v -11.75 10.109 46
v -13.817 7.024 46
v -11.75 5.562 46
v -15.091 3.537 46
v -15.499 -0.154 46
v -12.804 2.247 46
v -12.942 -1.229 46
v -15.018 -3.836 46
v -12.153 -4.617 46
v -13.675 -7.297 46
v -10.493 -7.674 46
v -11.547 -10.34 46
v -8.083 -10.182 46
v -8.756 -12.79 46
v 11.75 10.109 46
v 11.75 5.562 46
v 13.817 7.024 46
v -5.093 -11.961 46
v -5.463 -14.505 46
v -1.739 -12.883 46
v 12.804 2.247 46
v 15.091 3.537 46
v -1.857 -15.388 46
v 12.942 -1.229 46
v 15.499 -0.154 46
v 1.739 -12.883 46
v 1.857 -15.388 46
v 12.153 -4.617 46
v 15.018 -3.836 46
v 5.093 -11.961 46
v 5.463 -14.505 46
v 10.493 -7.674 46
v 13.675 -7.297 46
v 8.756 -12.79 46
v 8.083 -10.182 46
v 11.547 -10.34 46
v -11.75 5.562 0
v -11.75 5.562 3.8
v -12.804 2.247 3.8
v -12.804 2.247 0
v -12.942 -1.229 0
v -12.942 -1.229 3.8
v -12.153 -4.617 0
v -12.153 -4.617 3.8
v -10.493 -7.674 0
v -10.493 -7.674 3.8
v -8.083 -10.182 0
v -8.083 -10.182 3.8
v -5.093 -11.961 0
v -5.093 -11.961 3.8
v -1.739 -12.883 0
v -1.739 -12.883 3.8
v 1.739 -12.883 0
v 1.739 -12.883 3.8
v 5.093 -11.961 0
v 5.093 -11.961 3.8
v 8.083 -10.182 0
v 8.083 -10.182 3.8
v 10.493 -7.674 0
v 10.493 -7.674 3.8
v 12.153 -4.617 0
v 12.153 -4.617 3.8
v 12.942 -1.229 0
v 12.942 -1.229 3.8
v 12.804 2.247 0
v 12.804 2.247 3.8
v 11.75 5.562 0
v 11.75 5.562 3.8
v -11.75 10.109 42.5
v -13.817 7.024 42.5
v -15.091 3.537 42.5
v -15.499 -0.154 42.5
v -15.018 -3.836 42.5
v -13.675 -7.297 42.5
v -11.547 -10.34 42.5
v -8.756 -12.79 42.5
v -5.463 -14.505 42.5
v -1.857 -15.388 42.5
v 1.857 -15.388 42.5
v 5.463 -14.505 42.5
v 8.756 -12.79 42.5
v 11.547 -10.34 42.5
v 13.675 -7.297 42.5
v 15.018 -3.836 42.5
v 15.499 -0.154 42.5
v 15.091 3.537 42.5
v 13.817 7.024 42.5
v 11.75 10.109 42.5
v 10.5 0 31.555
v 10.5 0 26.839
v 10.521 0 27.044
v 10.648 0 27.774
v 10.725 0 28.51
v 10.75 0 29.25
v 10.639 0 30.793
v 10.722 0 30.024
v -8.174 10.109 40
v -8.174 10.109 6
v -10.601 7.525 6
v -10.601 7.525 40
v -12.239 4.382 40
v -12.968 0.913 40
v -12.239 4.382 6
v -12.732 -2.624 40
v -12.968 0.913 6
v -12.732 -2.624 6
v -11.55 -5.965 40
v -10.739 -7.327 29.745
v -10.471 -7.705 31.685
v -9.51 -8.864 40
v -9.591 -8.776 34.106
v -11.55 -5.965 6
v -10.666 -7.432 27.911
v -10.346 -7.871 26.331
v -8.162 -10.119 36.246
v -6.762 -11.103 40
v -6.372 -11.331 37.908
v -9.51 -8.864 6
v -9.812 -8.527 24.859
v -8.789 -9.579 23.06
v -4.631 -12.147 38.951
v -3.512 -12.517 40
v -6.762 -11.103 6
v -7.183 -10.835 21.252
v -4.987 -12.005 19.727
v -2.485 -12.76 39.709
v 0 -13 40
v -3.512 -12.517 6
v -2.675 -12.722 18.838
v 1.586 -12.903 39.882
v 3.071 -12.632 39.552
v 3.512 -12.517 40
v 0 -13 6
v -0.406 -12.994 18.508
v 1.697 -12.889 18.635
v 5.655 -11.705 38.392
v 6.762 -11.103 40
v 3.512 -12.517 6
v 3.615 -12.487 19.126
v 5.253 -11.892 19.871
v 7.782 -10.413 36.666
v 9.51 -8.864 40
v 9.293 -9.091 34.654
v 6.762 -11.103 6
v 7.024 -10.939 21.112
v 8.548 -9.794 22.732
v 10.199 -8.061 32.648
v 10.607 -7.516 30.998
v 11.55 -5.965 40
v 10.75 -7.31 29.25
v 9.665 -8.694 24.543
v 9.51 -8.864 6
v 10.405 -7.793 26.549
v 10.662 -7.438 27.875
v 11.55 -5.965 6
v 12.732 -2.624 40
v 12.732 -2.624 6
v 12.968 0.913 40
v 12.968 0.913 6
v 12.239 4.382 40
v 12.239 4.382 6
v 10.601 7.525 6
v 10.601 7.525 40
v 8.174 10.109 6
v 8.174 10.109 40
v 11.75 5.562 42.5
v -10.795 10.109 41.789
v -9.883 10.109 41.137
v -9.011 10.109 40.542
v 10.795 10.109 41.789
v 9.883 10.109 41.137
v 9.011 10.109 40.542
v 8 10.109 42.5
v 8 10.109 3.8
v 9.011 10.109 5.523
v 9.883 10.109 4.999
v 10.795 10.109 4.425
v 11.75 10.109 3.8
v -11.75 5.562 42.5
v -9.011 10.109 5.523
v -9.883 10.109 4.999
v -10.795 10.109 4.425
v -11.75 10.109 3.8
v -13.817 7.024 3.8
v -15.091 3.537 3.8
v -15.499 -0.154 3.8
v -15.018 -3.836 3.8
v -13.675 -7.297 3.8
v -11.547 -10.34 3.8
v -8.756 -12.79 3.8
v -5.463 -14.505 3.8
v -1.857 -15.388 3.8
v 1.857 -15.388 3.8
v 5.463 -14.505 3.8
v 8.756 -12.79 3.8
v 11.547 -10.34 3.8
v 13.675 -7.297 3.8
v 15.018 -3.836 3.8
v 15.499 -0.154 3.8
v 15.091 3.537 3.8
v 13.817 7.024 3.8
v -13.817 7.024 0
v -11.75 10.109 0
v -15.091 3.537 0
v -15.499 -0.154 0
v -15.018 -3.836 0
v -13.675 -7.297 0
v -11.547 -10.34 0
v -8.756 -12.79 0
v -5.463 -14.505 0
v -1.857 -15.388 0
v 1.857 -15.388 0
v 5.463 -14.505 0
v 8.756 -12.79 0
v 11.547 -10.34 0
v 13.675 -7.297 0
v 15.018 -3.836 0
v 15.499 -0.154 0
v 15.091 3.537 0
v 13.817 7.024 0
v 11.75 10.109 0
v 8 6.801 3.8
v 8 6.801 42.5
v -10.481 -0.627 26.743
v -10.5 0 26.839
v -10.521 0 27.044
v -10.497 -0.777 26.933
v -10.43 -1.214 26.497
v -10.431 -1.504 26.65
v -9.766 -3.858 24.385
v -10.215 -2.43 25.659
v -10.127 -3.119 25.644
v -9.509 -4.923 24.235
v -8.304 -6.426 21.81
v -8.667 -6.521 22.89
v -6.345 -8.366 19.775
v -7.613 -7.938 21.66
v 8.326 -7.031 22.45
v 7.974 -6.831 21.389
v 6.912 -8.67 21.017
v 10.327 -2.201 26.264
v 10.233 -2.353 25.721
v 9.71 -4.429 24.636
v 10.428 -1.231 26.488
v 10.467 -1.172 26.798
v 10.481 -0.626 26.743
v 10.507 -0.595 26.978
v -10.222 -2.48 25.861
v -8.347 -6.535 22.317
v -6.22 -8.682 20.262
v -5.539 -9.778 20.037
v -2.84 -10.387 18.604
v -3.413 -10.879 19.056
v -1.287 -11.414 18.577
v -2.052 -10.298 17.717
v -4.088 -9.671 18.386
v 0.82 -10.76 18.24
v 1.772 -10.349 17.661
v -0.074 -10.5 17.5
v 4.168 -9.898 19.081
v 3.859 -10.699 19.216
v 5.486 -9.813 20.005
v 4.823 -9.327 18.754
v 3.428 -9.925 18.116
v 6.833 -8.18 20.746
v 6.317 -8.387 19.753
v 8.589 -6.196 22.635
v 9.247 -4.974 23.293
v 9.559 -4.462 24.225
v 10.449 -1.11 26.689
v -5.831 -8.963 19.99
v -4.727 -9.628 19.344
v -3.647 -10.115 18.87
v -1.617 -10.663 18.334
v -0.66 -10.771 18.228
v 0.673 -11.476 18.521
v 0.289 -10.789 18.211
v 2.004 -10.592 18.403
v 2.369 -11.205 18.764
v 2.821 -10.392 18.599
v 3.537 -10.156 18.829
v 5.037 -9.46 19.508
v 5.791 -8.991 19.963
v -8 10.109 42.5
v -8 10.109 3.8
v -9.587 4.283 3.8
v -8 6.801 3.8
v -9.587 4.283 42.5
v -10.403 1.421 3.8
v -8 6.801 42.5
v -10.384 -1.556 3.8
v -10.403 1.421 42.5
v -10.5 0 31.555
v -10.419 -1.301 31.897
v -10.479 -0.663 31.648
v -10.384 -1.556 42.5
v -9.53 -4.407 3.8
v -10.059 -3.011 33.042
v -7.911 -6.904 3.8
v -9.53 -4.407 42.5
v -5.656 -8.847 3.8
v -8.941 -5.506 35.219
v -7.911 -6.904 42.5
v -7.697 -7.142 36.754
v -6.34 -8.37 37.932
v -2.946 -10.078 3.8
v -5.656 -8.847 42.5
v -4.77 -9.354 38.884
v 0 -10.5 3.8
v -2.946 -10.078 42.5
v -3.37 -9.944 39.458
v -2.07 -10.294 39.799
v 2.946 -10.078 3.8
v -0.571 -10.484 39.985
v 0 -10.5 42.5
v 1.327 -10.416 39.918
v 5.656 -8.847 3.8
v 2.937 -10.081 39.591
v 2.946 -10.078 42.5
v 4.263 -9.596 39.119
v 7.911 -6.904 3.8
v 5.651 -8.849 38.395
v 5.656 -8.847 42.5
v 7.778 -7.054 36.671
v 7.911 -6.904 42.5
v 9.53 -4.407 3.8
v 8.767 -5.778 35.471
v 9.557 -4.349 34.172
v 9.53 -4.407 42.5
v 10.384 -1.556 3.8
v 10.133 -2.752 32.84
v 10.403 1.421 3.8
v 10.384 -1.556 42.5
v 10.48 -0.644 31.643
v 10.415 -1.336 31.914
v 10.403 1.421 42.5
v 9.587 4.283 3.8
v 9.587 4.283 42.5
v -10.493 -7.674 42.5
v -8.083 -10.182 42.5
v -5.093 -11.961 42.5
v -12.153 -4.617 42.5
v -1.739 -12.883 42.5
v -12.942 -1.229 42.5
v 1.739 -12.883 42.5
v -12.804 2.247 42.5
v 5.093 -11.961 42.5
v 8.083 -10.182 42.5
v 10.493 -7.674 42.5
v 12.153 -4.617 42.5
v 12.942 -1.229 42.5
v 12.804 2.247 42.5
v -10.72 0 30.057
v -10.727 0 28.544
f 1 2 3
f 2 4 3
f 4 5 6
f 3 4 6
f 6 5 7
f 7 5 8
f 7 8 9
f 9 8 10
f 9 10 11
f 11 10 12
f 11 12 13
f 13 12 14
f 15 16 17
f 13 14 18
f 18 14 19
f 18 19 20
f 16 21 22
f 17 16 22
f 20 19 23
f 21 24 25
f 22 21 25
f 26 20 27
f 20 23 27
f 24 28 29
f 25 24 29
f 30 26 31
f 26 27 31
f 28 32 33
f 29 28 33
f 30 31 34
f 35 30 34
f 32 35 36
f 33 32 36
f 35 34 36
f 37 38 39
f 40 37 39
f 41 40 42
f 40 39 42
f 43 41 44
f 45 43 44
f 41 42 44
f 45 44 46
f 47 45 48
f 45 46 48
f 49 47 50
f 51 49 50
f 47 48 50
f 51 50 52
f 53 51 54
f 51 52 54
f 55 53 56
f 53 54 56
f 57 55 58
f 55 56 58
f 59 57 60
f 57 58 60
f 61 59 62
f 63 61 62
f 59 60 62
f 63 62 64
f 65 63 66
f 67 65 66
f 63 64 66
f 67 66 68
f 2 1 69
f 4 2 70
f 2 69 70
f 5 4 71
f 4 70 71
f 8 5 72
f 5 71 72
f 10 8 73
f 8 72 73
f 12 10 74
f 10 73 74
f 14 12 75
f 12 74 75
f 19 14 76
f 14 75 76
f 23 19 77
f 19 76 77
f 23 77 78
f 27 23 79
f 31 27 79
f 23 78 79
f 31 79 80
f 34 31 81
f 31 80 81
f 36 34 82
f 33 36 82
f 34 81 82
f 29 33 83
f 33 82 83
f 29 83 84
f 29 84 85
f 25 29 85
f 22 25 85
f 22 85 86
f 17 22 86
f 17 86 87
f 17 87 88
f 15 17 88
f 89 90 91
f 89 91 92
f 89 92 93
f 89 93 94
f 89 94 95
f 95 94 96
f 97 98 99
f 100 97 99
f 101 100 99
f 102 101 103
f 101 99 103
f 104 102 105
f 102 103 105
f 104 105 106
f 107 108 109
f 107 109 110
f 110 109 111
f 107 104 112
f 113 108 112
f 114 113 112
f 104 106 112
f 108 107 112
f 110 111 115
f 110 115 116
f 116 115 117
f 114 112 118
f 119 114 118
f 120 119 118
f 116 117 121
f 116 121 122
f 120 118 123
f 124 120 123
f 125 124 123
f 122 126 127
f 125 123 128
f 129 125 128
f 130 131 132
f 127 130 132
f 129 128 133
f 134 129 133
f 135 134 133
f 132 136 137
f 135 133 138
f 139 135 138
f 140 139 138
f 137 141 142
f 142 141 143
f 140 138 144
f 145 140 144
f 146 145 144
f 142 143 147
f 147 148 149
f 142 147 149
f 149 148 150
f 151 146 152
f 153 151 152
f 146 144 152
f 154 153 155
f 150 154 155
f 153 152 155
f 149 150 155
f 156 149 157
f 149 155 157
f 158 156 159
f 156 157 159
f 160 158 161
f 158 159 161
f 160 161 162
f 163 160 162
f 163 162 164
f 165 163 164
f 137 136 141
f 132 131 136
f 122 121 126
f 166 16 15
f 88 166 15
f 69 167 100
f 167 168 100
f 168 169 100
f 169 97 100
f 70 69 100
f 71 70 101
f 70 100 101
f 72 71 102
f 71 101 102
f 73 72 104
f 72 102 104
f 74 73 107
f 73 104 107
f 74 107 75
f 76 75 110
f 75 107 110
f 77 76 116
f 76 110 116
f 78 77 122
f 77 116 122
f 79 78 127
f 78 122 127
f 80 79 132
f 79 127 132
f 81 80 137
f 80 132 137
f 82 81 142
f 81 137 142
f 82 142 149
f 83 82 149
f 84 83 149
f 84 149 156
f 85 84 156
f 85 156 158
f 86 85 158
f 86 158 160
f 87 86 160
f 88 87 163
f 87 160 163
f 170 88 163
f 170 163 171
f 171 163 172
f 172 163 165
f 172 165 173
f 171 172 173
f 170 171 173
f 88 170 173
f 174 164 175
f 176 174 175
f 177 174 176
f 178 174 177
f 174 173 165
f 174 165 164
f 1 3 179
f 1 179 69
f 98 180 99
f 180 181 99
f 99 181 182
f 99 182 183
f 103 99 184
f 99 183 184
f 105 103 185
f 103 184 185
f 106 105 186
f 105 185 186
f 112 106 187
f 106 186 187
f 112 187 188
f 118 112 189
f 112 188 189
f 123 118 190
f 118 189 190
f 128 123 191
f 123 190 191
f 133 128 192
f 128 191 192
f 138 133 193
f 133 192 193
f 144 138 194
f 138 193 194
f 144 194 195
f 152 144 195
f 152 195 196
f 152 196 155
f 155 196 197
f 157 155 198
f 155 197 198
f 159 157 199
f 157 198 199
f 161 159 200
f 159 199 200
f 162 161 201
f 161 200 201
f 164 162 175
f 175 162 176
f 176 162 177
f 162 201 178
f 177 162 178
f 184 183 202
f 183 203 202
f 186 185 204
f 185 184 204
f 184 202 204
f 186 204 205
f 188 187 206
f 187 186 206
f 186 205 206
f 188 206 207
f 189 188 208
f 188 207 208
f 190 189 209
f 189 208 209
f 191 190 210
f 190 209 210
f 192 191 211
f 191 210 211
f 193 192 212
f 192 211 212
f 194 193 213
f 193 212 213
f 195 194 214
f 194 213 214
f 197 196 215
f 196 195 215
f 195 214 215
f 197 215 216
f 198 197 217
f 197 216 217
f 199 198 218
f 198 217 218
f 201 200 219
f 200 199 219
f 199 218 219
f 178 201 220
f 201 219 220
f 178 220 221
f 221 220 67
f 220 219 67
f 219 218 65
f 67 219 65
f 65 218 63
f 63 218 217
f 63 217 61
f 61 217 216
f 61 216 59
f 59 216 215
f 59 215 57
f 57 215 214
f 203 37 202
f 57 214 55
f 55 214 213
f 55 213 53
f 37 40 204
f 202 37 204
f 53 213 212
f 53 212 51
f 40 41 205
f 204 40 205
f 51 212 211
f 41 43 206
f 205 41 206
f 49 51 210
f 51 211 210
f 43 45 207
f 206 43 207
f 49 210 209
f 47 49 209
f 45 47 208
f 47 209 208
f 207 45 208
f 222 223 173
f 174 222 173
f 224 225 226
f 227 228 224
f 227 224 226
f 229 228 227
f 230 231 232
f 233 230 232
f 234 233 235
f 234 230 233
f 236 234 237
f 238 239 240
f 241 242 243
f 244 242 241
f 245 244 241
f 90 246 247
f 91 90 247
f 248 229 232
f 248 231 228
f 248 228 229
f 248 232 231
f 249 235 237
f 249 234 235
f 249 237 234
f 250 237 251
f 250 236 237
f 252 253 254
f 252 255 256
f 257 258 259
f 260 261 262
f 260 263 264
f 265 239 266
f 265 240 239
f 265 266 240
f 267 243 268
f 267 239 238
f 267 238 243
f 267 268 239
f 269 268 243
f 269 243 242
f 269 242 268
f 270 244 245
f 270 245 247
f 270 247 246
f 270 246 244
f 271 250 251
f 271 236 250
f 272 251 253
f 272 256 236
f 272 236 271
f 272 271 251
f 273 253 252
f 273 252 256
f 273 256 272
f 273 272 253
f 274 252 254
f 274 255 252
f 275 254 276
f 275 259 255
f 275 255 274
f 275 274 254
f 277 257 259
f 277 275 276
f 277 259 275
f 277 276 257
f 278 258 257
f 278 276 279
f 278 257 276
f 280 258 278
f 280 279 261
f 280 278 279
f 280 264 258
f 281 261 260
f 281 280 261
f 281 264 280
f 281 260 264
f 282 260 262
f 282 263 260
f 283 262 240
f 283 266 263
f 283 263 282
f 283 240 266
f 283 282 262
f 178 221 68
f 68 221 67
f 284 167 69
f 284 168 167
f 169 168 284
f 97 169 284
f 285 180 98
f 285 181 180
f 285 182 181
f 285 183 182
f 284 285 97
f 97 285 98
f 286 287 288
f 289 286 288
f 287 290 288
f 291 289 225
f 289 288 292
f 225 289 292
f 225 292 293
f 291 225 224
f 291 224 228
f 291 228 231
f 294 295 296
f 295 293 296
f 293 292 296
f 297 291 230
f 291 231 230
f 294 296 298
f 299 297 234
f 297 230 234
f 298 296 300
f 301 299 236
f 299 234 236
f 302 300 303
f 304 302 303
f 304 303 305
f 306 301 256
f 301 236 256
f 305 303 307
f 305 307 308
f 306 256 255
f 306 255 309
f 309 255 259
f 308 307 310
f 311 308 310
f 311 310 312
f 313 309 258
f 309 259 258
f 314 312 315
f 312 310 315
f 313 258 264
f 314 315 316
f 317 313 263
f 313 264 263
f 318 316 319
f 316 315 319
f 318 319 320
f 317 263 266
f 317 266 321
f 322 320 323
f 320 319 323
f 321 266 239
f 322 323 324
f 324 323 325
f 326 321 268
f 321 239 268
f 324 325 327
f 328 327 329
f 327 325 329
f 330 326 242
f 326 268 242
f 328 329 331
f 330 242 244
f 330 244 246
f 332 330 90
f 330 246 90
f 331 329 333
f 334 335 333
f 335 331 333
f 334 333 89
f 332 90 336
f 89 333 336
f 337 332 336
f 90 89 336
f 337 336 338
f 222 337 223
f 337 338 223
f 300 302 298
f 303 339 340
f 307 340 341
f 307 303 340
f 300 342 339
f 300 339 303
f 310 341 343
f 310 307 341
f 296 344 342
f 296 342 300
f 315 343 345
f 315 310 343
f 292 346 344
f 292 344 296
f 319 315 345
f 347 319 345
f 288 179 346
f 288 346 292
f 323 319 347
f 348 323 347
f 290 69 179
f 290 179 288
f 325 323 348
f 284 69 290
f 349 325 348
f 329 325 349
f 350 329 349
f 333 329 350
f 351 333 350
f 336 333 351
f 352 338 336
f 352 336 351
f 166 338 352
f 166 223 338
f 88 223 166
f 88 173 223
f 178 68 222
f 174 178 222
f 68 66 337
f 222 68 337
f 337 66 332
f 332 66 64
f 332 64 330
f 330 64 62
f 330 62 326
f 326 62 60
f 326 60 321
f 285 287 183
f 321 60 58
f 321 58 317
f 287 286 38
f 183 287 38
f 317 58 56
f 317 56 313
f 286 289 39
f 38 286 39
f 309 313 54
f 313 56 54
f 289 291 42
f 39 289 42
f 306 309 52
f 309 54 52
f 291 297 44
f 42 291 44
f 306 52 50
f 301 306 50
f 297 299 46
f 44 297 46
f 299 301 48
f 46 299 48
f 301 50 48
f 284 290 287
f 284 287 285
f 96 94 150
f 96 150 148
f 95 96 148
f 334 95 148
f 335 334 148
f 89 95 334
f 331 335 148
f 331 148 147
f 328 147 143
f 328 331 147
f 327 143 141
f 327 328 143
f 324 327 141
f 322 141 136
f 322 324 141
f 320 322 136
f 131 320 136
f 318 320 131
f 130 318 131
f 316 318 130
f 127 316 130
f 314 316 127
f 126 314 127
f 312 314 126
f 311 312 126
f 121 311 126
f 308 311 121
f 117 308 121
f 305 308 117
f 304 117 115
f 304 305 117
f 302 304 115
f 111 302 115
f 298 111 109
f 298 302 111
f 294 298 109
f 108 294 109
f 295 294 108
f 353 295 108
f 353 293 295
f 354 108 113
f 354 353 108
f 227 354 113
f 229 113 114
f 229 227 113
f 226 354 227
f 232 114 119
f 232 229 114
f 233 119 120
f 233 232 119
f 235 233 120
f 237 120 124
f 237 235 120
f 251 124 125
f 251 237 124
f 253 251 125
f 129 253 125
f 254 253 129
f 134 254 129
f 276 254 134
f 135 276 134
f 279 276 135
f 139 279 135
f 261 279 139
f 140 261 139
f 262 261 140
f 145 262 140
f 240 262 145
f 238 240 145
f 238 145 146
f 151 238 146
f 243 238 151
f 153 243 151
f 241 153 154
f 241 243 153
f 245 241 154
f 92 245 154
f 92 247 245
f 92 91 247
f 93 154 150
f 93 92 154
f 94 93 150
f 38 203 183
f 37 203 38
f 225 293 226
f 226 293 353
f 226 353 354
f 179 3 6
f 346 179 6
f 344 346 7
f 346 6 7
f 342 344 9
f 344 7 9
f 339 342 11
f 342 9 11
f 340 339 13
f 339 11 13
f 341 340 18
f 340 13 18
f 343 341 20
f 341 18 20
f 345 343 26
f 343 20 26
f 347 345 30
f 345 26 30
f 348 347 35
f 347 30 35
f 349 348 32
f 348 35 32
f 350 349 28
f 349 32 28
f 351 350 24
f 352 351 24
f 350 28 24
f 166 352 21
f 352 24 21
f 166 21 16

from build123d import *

# Parameters (mm, degrees)
F2_W      = 16
F2_H      = 12.7785220167
F3_DEPTH  = 46.001
F4_W      = 23.5
F4_H      = 13.4564294844
F5_DEPTH  = 3.5
F6_W      = 23.5
F6_H      = 13.0310004231
F7_DEPTH  = 3.8
F8_R      = 10.75
F9_DEPTH  = 25
F11_W     = 31.7701289256
F11_H     = 9.9966360929
F12_DEPTH = 46.001
F14_R     = 1


with BuildPart() as f1:
    # F0 (on Front) → F1 (revolve)
    with BuildSketch(Plane.XZ):
        Polygon((-15.5, 0), (-13, 0), (-13, 3.8), (-10.5, 3.8), (-10.5, 42.5), (-13, 42.5), (-13, 46), (-15.5, 46), (-15.5, 42.5), (-13, 40), (-13, 6), (-15.5, 3.8), align=None)
    revolve(axis=Axis((0, 0, 24.8965322971), (0, 0, 1)))

    # F2 (on face) → F3 (cut, through all)
    with BuildSketch(Plane.XY.offset(46)):
        with Locations((0, 11.7036290467)):
            Rectangle(F2_W, F2_H)
    extrude(amount=-F3_DEPTH, mode=Mode.SUBTRACT)

    # F4 (on face) → F5 (cut, through all)
    with BuildSketch(Plane.XY.offset(46)):
        with Locations((0, 10.8011863194)):
            Rectangle(F4_W, F4_H)
    extrude(amount=-F5_DEPTH, mode=Mode.SUBTRACT)

    # F6 (on face) → F7 (cut, through all)
    with BuildSketch(Plane(origin=(0, 0, 0), x_dir=(1, 0, 0), z_dir=(0, 0, -1))):
        with Locations((0, -9.3560743844)):
            Rectangle(F6_W, F6_H)
    extrude(amount=-F7_DEPTH, mode=Mode.SUBTRACT)

    # F8 (on Front) → F9 (cut)
    with BuildSketch(Plane.XZ):
        with Locations((0, 29.25)):
            Circle(F8_R)
    extrude(amount=F9_DEPTH, mode=Mode.SUBTRACT)

    # F11 (on Top) → F12 (cut, through all)
    with BuildSketch(Plane.XY):
        with Locations((0.0608135015, 15.107101356)):
            Rectangle(F11_W, F11_H)
    extrude(amount=F12_DEPTH, mode=Mode.SUBTRACT)

    # F14
    f14_edges = [f1.edges().sort_by_distance(p)[0] for p in [
        (0.039521, -10.499926, 18.500073),
    ]]
    fillet(f14_edges, radius=F14_R)


solid = f1.part
